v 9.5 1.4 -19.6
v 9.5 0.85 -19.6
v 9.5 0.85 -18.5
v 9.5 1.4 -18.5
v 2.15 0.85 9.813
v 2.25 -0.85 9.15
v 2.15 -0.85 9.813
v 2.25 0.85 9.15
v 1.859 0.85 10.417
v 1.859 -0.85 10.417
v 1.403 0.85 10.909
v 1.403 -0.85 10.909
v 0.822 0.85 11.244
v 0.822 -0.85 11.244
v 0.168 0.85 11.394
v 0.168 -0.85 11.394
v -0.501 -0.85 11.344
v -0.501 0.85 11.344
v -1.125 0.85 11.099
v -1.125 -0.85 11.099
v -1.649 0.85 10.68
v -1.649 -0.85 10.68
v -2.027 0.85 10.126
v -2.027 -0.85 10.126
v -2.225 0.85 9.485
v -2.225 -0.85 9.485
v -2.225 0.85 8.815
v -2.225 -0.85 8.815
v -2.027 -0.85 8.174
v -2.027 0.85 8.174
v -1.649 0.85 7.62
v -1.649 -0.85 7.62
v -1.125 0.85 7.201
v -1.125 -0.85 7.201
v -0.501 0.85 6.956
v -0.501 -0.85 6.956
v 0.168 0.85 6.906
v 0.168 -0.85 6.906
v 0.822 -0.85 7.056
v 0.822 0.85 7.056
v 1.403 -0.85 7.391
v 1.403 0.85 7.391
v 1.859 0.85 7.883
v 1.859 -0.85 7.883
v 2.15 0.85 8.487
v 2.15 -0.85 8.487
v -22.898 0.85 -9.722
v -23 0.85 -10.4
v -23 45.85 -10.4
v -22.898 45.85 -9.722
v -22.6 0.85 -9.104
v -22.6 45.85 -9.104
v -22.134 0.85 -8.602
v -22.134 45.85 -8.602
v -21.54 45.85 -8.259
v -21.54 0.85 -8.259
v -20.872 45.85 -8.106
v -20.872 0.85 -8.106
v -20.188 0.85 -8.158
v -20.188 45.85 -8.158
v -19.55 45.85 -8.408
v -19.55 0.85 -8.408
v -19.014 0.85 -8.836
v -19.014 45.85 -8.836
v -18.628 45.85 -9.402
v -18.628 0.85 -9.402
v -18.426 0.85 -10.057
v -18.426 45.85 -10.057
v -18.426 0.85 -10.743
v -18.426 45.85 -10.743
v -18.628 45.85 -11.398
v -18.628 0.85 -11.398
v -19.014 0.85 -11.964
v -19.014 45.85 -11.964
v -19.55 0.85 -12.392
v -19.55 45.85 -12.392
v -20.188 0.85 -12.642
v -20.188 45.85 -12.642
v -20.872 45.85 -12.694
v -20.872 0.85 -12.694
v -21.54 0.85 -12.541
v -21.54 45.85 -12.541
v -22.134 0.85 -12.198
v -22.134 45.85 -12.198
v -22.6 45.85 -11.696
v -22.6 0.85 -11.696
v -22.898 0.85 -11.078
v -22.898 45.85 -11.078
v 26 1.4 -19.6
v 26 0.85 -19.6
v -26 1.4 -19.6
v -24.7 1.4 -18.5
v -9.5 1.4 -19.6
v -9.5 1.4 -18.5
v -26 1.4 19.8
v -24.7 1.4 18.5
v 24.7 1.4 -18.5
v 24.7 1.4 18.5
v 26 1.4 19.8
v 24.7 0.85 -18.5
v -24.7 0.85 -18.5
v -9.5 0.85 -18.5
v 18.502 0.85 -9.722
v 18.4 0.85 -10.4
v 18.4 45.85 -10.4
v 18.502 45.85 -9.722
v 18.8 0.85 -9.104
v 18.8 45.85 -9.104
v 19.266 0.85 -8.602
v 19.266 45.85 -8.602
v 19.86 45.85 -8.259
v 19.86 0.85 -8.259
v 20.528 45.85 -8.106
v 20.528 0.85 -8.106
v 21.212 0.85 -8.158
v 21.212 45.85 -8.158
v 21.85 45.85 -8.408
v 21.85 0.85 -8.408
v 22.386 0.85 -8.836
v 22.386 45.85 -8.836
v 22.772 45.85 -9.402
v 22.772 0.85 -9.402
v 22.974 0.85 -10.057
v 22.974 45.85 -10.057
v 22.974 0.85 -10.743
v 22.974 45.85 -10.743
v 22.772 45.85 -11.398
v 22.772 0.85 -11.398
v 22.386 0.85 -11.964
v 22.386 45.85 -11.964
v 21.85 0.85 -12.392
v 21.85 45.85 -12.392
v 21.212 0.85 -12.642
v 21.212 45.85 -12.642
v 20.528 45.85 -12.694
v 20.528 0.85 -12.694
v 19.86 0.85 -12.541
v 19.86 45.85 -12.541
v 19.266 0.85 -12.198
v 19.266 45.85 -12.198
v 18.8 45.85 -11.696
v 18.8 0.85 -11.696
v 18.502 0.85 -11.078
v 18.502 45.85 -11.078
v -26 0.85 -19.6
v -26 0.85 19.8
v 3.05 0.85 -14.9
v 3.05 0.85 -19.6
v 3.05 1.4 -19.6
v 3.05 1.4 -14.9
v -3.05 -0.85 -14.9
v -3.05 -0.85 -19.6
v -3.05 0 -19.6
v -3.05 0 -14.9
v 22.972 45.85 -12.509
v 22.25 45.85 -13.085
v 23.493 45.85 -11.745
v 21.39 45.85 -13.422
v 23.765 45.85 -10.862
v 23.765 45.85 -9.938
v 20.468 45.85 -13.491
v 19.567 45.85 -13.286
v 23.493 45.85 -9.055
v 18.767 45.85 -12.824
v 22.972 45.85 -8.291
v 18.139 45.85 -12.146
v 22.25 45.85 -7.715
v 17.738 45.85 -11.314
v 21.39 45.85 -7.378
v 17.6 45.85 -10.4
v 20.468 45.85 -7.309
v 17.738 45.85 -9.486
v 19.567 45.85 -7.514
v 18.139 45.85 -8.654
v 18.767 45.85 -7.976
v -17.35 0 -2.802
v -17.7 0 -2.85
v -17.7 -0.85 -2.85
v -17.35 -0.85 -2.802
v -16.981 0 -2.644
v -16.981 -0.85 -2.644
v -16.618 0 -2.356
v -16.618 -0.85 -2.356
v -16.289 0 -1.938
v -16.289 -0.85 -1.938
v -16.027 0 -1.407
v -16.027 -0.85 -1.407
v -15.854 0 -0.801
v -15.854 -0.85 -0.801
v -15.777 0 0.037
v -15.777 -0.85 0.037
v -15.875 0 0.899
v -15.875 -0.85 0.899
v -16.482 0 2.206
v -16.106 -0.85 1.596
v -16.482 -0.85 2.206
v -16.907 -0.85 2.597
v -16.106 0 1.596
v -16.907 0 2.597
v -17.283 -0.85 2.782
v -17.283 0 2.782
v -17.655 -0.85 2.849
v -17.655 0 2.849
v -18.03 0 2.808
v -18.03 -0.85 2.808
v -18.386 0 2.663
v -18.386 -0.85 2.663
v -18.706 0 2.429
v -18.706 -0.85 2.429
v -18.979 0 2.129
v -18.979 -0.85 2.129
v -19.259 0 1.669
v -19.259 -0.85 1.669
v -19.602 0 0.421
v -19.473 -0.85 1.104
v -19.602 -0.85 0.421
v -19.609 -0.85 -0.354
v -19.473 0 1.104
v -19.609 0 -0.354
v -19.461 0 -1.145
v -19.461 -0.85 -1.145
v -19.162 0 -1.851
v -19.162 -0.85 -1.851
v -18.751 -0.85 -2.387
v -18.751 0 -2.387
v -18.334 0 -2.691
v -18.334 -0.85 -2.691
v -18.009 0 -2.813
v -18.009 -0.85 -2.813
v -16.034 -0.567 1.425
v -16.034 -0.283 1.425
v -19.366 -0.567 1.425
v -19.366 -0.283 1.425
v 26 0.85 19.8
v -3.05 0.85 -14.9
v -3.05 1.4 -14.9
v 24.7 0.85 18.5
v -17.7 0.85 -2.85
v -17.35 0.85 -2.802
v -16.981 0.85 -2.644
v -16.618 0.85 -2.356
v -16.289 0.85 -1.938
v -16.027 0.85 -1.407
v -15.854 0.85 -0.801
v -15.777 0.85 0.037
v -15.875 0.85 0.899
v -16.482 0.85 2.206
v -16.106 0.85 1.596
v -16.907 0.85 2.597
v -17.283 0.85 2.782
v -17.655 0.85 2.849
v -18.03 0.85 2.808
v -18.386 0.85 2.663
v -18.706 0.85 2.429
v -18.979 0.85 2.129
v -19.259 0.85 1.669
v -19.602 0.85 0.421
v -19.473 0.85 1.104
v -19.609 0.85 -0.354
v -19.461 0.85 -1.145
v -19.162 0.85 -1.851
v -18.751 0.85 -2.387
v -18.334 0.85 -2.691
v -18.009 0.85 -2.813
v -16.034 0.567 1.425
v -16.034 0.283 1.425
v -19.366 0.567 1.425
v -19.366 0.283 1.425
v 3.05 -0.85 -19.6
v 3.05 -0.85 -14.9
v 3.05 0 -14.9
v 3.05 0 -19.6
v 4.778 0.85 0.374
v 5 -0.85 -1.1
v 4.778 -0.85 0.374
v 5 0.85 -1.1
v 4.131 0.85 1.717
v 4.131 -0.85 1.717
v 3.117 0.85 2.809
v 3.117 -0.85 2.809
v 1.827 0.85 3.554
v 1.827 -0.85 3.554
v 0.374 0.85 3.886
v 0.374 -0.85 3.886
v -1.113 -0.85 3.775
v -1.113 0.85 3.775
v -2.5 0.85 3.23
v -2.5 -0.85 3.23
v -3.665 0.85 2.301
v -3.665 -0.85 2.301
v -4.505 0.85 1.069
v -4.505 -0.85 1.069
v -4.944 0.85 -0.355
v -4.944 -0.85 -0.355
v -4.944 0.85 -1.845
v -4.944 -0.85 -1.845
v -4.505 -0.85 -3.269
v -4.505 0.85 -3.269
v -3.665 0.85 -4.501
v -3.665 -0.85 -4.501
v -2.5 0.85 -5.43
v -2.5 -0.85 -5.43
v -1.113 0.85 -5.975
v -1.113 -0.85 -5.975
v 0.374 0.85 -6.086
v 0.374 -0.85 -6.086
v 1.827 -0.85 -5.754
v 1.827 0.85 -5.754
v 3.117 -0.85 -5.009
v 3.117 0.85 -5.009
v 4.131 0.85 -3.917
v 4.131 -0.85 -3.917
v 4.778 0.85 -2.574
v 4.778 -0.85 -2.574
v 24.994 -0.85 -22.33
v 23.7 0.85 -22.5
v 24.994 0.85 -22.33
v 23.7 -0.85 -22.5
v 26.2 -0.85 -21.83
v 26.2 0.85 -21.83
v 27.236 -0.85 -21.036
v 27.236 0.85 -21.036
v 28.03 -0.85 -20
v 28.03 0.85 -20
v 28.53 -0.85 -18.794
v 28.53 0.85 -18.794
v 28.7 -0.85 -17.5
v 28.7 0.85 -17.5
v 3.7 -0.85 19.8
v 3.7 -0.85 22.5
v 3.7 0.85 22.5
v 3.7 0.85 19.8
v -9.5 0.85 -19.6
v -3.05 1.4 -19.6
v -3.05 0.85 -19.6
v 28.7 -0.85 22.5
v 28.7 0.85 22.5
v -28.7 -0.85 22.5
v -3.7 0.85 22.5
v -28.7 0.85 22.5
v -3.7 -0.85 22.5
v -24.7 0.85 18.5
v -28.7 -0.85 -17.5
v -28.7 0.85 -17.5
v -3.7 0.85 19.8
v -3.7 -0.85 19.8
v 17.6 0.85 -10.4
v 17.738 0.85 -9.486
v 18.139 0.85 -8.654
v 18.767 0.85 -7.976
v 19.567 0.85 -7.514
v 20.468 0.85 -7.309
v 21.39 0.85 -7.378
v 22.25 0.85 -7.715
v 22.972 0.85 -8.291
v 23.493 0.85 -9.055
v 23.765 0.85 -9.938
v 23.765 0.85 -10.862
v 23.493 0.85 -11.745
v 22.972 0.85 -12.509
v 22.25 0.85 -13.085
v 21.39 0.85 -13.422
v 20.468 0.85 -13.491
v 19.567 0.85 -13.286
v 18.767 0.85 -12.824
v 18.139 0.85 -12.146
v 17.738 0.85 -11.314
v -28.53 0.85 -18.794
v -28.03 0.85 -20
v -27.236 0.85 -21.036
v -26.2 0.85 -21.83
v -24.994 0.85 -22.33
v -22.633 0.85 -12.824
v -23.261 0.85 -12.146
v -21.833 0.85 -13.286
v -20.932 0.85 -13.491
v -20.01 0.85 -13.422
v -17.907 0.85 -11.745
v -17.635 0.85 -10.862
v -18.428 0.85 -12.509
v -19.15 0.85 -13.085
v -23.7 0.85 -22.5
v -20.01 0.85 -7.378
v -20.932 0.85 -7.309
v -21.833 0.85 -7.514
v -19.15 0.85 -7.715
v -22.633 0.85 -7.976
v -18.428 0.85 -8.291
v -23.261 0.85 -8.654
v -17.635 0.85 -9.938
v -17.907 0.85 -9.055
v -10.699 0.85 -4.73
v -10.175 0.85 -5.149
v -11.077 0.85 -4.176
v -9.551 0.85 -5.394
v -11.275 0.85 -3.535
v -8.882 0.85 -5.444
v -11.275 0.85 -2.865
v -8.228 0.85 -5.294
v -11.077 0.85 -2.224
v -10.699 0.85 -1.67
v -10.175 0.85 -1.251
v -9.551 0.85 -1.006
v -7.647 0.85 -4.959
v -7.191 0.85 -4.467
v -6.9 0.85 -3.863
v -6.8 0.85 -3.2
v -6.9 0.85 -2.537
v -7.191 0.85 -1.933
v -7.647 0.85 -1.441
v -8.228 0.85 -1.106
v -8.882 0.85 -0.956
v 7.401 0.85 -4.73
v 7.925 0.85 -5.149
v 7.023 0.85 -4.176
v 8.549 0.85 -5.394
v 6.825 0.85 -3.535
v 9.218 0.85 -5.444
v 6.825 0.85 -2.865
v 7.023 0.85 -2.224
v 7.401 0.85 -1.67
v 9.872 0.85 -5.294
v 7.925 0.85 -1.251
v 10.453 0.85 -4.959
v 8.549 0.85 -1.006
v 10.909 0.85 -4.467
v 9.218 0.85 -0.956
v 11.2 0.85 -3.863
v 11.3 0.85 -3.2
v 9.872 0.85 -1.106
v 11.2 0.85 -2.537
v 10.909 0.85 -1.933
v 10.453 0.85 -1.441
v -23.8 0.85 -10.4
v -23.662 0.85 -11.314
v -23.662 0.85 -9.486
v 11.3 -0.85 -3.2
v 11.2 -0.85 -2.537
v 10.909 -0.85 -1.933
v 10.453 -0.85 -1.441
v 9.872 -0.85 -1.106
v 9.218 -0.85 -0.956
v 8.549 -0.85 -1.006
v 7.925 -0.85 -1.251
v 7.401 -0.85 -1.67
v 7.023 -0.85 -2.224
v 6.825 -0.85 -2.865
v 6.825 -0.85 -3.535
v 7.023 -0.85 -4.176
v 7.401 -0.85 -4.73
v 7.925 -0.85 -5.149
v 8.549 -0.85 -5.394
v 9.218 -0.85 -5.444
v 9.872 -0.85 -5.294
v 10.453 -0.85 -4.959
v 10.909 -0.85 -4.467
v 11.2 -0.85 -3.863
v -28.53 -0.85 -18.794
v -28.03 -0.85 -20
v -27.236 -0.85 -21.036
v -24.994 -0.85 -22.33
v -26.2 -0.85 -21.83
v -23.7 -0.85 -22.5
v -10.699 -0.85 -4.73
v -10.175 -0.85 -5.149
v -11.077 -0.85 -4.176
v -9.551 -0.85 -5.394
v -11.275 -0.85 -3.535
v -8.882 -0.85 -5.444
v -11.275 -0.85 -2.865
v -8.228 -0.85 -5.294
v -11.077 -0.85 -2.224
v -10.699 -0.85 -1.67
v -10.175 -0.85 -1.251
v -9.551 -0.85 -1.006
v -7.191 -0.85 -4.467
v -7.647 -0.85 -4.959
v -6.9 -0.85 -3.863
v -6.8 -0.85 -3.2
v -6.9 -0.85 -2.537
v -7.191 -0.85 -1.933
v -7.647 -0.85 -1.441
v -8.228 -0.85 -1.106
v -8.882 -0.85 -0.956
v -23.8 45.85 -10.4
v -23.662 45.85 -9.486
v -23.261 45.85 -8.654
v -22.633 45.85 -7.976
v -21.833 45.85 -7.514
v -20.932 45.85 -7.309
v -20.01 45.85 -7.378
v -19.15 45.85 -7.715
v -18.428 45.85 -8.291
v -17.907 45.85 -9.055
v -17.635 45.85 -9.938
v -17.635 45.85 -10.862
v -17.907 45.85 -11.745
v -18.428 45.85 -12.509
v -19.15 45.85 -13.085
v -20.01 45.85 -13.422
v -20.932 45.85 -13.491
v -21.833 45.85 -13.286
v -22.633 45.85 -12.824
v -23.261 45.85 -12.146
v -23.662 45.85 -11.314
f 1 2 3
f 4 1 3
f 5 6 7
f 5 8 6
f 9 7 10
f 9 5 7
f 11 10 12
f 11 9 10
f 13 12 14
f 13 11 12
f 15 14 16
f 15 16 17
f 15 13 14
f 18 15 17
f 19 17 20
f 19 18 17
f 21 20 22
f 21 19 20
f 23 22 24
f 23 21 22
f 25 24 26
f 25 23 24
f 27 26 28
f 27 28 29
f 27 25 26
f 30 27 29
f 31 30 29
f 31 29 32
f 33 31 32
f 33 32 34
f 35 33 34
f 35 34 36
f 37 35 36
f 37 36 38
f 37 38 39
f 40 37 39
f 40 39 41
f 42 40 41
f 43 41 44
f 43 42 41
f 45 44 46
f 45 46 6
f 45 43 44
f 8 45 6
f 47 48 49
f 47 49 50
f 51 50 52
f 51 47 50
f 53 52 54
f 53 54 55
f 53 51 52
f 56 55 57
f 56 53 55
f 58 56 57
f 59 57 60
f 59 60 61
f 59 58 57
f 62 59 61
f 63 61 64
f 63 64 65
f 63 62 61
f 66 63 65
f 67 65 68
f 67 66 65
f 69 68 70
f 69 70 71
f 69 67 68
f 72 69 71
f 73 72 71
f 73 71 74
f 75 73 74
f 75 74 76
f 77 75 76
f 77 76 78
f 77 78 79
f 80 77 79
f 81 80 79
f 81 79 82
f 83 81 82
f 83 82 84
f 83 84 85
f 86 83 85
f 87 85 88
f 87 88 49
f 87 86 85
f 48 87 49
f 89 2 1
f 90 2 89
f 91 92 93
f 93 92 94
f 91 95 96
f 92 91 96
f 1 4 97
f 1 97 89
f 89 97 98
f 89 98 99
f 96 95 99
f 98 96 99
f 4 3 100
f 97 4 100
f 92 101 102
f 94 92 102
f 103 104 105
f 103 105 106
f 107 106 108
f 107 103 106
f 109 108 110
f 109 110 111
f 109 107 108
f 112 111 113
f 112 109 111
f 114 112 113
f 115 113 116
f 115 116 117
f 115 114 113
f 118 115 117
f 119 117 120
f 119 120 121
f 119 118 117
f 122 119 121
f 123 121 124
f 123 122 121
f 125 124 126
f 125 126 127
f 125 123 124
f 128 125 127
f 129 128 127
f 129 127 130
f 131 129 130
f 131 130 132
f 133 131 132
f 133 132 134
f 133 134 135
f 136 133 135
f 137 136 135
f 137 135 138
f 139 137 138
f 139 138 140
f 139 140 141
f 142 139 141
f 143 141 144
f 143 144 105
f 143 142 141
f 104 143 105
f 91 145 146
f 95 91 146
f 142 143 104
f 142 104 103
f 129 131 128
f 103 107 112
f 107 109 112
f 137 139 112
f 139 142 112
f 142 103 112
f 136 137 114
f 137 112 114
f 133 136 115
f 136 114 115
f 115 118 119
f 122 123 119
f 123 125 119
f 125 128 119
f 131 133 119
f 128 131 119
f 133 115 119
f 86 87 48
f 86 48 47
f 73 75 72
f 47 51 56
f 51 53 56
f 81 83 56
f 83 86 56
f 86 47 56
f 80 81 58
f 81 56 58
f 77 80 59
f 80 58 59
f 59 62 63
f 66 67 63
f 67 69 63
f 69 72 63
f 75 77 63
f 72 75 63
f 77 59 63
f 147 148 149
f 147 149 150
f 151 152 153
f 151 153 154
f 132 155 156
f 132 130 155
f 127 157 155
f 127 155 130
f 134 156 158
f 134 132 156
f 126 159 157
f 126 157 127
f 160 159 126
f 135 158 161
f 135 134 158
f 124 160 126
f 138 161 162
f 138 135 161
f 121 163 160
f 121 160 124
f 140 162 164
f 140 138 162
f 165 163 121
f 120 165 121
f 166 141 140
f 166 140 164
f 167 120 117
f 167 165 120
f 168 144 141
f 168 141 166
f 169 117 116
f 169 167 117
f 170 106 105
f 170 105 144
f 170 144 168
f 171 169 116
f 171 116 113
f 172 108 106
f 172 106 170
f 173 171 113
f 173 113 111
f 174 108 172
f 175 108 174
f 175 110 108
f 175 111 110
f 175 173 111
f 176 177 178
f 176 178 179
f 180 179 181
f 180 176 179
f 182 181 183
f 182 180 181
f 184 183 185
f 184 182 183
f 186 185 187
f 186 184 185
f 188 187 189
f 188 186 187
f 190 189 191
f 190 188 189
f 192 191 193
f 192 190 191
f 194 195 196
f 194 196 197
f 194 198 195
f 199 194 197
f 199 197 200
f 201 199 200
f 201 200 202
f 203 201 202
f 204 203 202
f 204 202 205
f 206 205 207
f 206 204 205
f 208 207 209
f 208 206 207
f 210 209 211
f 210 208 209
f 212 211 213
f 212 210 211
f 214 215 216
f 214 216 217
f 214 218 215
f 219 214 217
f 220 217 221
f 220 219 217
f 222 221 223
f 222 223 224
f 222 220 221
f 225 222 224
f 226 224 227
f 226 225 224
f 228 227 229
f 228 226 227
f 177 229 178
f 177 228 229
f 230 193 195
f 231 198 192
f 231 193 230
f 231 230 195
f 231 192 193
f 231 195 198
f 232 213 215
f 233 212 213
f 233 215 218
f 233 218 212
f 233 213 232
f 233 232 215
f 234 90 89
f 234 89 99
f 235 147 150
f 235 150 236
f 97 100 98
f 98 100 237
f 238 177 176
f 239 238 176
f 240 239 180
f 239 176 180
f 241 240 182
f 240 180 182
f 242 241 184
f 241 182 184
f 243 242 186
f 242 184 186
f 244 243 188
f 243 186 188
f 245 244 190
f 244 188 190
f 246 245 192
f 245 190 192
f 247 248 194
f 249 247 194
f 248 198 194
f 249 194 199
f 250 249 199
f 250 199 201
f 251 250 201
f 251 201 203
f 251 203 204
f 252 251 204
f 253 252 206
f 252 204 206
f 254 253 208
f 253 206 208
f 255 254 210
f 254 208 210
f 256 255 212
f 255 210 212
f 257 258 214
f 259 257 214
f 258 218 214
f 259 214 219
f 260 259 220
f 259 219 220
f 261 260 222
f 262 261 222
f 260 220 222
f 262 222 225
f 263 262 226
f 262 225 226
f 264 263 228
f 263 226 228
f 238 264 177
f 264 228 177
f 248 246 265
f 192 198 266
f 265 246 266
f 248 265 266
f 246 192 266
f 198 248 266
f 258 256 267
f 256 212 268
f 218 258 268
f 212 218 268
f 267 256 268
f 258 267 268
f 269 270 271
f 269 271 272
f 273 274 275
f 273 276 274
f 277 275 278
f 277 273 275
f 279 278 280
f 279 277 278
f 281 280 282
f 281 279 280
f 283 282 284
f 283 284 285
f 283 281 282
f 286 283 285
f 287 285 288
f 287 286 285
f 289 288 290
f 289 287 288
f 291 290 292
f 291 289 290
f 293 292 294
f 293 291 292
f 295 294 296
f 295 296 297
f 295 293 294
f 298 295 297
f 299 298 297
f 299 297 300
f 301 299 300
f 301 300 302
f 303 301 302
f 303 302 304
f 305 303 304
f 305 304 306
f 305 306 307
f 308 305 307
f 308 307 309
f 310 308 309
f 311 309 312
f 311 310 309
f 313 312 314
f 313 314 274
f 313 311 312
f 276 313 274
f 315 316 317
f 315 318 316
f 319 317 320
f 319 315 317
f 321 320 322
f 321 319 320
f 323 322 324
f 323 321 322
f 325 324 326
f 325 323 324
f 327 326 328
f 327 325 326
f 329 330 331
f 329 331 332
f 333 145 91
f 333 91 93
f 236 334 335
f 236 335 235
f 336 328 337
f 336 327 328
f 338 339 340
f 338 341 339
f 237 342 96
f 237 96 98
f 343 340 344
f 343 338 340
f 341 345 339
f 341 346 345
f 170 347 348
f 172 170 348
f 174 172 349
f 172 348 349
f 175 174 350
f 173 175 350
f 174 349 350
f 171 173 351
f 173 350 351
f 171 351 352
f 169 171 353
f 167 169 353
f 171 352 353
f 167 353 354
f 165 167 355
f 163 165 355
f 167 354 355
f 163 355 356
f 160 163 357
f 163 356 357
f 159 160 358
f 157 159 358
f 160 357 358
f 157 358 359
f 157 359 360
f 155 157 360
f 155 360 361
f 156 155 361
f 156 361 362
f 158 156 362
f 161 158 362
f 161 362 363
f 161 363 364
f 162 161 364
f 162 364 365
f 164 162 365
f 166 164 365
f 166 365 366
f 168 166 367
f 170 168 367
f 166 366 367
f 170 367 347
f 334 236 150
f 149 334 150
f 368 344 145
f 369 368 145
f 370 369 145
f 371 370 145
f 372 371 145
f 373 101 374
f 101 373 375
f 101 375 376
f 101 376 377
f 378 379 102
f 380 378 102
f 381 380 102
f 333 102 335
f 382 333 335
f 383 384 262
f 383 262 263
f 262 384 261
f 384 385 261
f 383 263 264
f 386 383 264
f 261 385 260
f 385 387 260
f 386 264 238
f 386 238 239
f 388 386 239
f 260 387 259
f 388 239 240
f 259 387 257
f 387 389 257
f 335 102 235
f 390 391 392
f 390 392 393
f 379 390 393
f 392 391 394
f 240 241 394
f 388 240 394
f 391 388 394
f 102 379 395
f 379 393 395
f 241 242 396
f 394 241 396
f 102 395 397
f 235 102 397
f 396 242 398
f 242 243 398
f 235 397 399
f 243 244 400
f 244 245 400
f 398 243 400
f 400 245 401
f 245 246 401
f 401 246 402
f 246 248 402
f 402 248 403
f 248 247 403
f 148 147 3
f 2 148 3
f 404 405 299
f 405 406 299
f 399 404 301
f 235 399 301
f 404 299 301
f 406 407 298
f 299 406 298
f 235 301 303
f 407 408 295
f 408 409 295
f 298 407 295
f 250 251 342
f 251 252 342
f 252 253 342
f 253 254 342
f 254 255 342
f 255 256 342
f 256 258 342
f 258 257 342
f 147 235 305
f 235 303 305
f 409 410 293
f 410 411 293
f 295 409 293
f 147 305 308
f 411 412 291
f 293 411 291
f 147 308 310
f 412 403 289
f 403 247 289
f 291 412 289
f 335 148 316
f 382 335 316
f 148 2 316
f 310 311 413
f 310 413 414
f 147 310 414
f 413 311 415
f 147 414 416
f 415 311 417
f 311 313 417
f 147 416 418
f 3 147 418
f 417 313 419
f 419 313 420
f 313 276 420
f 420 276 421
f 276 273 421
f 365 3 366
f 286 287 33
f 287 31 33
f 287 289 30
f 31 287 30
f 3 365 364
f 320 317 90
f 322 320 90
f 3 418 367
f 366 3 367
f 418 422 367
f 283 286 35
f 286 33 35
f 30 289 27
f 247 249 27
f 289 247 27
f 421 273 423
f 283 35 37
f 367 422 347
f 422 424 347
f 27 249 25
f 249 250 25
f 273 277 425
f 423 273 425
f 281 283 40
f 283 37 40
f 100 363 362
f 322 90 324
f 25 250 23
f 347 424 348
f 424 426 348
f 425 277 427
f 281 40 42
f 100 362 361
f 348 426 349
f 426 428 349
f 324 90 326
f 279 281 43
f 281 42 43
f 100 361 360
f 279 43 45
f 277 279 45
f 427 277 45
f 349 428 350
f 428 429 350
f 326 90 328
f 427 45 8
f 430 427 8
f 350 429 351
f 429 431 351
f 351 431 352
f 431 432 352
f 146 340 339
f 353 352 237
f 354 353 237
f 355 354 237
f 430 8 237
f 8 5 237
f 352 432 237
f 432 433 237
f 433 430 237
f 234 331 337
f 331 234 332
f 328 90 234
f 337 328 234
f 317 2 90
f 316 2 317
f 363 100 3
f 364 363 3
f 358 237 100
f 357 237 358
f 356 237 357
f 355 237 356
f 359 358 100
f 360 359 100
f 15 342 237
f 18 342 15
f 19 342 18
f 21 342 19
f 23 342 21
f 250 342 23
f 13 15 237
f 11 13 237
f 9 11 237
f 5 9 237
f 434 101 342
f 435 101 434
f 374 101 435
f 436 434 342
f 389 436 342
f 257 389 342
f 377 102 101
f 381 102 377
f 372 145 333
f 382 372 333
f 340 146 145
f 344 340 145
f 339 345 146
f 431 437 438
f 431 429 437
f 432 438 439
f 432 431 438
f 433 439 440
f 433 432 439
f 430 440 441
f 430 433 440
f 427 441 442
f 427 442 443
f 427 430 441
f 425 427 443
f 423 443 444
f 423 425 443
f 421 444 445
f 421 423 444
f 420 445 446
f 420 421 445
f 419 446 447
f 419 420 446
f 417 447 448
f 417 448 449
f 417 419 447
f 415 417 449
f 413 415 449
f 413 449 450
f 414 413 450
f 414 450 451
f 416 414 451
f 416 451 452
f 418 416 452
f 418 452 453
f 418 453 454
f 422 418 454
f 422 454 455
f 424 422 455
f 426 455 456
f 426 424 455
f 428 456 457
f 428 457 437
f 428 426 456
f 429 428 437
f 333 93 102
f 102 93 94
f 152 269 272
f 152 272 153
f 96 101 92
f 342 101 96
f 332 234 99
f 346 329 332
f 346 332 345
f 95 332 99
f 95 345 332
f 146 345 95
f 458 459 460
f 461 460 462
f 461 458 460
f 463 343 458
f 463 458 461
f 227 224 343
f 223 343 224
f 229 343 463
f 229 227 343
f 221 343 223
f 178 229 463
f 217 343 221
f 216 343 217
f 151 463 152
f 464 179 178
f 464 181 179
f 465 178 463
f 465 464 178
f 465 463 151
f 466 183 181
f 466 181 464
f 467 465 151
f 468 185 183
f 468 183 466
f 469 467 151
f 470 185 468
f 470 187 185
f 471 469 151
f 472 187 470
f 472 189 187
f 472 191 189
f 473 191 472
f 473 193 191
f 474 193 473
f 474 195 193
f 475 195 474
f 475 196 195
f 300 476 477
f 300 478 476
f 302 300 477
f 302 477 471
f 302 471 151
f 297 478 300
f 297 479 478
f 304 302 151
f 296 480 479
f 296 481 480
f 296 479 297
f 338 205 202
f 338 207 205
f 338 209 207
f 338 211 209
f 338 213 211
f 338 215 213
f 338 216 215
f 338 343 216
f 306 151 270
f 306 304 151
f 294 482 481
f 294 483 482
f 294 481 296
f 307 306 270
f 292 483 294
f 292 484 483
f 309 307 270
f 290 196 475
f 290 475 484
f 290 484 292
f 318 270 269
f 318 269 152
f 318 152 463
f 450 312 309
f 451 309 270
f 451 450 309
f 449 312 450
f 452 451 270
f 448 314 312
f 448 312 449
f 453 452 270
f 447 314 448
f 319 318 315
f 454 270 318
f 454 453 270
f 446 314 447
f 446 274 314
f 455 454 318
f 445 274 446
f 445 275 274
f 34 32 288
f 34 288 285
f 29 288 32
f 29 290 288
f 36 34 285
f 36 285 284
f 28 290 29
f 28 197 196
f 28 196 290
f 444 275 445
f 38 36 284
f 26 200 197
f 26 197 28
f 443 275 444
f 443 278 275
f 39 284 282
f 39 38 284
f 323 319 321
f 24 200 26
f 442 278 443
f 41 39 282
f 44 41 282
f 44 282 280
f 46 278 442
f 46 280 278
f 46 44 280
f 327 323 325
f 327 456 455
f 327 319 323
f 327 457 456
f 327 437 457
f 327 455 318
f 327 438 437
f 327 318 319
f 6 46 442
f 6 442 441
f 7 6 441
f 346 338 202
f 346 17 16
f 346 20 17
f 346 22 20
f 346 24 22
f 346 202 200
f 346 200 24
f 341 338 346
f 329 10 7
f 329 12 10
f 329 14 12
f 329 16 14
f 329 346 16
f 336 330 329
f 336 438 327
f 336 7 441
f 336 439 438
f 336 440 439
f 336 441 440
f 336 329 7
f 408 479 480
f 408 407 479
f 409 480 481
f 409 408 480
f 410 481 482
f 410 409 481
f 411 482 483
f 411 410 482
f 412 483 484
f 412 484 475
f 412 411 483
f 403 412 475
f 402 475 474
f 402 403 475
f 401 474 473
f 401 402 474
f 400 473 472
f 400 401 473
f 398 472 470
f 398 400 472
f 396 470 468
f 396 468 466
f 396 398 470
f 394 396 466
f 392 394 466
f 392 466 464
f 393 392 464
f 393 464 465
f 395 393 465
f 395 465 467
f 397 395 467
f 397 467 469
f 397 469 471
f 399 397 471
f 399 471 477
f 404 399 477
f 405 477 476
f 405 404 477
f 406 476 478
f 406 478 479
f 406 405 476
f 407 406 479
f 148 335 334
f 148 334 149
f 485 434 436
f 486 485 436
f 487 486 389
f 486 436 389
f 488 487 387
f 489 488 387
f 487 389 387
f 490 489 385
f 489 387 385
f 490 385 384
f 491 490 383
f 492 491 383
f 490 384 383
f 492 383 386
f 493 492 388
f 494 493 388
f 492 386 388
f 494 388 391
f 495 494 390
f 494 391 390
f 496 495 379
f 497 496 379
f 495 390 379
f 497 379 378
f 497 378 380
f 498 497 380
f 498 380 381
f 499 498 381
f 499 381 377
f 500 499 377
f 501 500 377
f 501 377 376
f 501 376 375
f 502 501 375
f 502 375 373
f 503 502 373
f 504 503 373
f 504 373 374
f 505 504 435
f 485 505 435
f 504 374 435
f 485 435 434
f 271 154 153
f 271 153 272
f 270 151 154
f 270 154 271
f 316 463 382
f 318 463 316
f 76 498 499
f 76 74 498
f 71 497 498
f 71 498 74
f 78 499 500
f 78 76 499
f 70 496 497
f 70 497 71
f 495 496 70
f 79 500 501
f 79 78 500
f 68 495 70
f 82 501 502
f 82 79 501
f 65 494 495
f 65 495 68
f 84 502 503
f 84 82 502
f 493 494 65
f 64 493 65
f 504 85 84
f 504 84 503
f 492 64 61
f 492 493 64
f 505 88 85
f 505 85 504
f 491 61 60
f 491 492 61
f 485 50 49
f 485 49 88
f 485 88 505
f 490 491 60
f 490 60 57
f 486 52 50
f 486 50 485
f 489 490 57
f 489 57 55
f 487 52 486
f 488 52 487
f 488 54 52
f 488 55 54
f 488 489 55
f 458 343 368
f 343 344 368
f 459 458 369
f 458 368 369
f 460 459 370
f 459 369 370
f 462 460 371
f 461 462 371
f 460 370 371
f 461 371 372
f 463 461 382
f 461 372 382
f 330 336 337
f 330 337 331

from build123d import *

# Parameters (mm, degrees)
F1_DEPTH = 1.4
F0_R     = 2.25
F0_R_2   = 5
F2_DEPTH = 0.85
F3_W     = 52
F3_H     = 39.4
F3_W_2   = 49.4
F3_H_2   = 37
F4_DEPTH = 1.4
F6_R     = 3.1
F6_R_2   = 2.3
F7_DEPTH = 45
F8_R     = 5
F5_W     = 6.45
F5_H     = 1.1
F9_DEPTH = 0.55


with BuildPart() as f1:
    # F0 (on Front) → F1 (new body)
    with BuildSketch(Plane.XZ):
        Polygon((2.5, -14.9), (-2.5, -14.9), (-3.05, -14.9), (-3.05, -19.6), (3.05, -19.6), (3.05, -14.9), align=None)
    extrude(amount=-F1_DEPTH)

    # F0 (on Front) → F2 (join, symmetric)
    with BuildSketch(Plane.XZ):
        Polygon((-28.7, -22.5), (28.7, -22.5), (28.7, 22.5), (3.7, 22.5), (3.7, 19.8), (-3.7, 19.8), (-3.7, 22.5), (-28.7, 22.5), align=None)
        Polygon((-3.05, -14.9), (-2.5, -14.9), (2.5, -14.9), (3.05, -14.9), (3.05, -19.6), (-3.05, -19.6), align=None, mode=Mode.SUBTRACT)
        with BuildLine():
            add(Edge.make_bspline(
                [(-17.7, -2.85), (-14.3683195671, -2.85), (-16.0341597836, 1.425), (-17.7, 5.7), (-19.3658402164, 1.425), (-21.0316804329, -2.85), (-17.7, -2.85)],
                knots=[0, 0, 0, 2.0943951024, 2.0943951024, 4.1887902048, 4.1887902048, 6.2831853072, 6.2831853072, 6.2831853072], degree=2, weights=[1, 0.5, 1, 0.5, 1, 0.5, 1]))
        make_face(mode=Mode.SUBTRACT)
        with Locations((-9.05, -3.2)):
            Circle(F0_R, mode=Mode.SUBTRACT)
        with Locations((0, -1.1)):
            Circle(F0_R_2, mode=Mode.SUBTRACT)
        with Locations((9.05, -3.2)):
            Circle(F0_R, mode=Mode.SUBTRACT)
        with Locations((0, 9.15)):
            Circle(F0_R, mode=Mode.SUBTRACT)
    extrude(amount=F2_DEPTH, both=True)

    # F3 (on Front) → F4 (join)
    with BuildSketch(Plane.XZ):
        with Locations((0, 0.1)):
            Rectangle(F3_W, F3_H)
        Rectangle(F3_W_2, F3_H_2, mode=Mode.SUBTRACT)
    extrude(amount=-F4_DEPTH)

    # F6 (on face) → F7 (join)
    with BuildSketch(Plane(origin=(0, 0.85, 0), x_dir=(-1, 0, 0), z_dir=(0, 1, 0))):
        with Locations((-20.7, -10.4)):
            Circle(F6_R)
        with Locations((-20.7, -10.4)):
            Circle(F6_R_2, mode=Mode.SUBTRACT)
        with Locations((20.7, -10.4)):
            Circle(F6_R)
        with Locations((20.7, -10.4)):
            Circle(F6_R_2, mode=Mode.SUBTRACT)
    extrude(amount=F7_DEPTH)

    # F8
    f8_edges = [f1.edges().sort_by_distance(p)[0] for p in [
        (28.7, 0, -22.5),
        (-28.7, 0, -22.5),
    ]]
    fillet(f8_edges, radius=F8_R)

    # F5 (on face) → F9 (cut, symmetric)
    with BuildSketch(Plane(origin=(0, 1.4, 0), x_dir=(-1, 0, 0), z_dir=(0, 1, 0))):
        with Locations((-6.275, -19.05)):
            Rectangle(F5_W, F5_H)
        with Locations((6.275, -19.05)):
            Rectangle(F5_W, F5_H)
    extrude(amount=F9_DEPTH, both=True, mode=Mode.SUBTRACT)


solid = f1.part
